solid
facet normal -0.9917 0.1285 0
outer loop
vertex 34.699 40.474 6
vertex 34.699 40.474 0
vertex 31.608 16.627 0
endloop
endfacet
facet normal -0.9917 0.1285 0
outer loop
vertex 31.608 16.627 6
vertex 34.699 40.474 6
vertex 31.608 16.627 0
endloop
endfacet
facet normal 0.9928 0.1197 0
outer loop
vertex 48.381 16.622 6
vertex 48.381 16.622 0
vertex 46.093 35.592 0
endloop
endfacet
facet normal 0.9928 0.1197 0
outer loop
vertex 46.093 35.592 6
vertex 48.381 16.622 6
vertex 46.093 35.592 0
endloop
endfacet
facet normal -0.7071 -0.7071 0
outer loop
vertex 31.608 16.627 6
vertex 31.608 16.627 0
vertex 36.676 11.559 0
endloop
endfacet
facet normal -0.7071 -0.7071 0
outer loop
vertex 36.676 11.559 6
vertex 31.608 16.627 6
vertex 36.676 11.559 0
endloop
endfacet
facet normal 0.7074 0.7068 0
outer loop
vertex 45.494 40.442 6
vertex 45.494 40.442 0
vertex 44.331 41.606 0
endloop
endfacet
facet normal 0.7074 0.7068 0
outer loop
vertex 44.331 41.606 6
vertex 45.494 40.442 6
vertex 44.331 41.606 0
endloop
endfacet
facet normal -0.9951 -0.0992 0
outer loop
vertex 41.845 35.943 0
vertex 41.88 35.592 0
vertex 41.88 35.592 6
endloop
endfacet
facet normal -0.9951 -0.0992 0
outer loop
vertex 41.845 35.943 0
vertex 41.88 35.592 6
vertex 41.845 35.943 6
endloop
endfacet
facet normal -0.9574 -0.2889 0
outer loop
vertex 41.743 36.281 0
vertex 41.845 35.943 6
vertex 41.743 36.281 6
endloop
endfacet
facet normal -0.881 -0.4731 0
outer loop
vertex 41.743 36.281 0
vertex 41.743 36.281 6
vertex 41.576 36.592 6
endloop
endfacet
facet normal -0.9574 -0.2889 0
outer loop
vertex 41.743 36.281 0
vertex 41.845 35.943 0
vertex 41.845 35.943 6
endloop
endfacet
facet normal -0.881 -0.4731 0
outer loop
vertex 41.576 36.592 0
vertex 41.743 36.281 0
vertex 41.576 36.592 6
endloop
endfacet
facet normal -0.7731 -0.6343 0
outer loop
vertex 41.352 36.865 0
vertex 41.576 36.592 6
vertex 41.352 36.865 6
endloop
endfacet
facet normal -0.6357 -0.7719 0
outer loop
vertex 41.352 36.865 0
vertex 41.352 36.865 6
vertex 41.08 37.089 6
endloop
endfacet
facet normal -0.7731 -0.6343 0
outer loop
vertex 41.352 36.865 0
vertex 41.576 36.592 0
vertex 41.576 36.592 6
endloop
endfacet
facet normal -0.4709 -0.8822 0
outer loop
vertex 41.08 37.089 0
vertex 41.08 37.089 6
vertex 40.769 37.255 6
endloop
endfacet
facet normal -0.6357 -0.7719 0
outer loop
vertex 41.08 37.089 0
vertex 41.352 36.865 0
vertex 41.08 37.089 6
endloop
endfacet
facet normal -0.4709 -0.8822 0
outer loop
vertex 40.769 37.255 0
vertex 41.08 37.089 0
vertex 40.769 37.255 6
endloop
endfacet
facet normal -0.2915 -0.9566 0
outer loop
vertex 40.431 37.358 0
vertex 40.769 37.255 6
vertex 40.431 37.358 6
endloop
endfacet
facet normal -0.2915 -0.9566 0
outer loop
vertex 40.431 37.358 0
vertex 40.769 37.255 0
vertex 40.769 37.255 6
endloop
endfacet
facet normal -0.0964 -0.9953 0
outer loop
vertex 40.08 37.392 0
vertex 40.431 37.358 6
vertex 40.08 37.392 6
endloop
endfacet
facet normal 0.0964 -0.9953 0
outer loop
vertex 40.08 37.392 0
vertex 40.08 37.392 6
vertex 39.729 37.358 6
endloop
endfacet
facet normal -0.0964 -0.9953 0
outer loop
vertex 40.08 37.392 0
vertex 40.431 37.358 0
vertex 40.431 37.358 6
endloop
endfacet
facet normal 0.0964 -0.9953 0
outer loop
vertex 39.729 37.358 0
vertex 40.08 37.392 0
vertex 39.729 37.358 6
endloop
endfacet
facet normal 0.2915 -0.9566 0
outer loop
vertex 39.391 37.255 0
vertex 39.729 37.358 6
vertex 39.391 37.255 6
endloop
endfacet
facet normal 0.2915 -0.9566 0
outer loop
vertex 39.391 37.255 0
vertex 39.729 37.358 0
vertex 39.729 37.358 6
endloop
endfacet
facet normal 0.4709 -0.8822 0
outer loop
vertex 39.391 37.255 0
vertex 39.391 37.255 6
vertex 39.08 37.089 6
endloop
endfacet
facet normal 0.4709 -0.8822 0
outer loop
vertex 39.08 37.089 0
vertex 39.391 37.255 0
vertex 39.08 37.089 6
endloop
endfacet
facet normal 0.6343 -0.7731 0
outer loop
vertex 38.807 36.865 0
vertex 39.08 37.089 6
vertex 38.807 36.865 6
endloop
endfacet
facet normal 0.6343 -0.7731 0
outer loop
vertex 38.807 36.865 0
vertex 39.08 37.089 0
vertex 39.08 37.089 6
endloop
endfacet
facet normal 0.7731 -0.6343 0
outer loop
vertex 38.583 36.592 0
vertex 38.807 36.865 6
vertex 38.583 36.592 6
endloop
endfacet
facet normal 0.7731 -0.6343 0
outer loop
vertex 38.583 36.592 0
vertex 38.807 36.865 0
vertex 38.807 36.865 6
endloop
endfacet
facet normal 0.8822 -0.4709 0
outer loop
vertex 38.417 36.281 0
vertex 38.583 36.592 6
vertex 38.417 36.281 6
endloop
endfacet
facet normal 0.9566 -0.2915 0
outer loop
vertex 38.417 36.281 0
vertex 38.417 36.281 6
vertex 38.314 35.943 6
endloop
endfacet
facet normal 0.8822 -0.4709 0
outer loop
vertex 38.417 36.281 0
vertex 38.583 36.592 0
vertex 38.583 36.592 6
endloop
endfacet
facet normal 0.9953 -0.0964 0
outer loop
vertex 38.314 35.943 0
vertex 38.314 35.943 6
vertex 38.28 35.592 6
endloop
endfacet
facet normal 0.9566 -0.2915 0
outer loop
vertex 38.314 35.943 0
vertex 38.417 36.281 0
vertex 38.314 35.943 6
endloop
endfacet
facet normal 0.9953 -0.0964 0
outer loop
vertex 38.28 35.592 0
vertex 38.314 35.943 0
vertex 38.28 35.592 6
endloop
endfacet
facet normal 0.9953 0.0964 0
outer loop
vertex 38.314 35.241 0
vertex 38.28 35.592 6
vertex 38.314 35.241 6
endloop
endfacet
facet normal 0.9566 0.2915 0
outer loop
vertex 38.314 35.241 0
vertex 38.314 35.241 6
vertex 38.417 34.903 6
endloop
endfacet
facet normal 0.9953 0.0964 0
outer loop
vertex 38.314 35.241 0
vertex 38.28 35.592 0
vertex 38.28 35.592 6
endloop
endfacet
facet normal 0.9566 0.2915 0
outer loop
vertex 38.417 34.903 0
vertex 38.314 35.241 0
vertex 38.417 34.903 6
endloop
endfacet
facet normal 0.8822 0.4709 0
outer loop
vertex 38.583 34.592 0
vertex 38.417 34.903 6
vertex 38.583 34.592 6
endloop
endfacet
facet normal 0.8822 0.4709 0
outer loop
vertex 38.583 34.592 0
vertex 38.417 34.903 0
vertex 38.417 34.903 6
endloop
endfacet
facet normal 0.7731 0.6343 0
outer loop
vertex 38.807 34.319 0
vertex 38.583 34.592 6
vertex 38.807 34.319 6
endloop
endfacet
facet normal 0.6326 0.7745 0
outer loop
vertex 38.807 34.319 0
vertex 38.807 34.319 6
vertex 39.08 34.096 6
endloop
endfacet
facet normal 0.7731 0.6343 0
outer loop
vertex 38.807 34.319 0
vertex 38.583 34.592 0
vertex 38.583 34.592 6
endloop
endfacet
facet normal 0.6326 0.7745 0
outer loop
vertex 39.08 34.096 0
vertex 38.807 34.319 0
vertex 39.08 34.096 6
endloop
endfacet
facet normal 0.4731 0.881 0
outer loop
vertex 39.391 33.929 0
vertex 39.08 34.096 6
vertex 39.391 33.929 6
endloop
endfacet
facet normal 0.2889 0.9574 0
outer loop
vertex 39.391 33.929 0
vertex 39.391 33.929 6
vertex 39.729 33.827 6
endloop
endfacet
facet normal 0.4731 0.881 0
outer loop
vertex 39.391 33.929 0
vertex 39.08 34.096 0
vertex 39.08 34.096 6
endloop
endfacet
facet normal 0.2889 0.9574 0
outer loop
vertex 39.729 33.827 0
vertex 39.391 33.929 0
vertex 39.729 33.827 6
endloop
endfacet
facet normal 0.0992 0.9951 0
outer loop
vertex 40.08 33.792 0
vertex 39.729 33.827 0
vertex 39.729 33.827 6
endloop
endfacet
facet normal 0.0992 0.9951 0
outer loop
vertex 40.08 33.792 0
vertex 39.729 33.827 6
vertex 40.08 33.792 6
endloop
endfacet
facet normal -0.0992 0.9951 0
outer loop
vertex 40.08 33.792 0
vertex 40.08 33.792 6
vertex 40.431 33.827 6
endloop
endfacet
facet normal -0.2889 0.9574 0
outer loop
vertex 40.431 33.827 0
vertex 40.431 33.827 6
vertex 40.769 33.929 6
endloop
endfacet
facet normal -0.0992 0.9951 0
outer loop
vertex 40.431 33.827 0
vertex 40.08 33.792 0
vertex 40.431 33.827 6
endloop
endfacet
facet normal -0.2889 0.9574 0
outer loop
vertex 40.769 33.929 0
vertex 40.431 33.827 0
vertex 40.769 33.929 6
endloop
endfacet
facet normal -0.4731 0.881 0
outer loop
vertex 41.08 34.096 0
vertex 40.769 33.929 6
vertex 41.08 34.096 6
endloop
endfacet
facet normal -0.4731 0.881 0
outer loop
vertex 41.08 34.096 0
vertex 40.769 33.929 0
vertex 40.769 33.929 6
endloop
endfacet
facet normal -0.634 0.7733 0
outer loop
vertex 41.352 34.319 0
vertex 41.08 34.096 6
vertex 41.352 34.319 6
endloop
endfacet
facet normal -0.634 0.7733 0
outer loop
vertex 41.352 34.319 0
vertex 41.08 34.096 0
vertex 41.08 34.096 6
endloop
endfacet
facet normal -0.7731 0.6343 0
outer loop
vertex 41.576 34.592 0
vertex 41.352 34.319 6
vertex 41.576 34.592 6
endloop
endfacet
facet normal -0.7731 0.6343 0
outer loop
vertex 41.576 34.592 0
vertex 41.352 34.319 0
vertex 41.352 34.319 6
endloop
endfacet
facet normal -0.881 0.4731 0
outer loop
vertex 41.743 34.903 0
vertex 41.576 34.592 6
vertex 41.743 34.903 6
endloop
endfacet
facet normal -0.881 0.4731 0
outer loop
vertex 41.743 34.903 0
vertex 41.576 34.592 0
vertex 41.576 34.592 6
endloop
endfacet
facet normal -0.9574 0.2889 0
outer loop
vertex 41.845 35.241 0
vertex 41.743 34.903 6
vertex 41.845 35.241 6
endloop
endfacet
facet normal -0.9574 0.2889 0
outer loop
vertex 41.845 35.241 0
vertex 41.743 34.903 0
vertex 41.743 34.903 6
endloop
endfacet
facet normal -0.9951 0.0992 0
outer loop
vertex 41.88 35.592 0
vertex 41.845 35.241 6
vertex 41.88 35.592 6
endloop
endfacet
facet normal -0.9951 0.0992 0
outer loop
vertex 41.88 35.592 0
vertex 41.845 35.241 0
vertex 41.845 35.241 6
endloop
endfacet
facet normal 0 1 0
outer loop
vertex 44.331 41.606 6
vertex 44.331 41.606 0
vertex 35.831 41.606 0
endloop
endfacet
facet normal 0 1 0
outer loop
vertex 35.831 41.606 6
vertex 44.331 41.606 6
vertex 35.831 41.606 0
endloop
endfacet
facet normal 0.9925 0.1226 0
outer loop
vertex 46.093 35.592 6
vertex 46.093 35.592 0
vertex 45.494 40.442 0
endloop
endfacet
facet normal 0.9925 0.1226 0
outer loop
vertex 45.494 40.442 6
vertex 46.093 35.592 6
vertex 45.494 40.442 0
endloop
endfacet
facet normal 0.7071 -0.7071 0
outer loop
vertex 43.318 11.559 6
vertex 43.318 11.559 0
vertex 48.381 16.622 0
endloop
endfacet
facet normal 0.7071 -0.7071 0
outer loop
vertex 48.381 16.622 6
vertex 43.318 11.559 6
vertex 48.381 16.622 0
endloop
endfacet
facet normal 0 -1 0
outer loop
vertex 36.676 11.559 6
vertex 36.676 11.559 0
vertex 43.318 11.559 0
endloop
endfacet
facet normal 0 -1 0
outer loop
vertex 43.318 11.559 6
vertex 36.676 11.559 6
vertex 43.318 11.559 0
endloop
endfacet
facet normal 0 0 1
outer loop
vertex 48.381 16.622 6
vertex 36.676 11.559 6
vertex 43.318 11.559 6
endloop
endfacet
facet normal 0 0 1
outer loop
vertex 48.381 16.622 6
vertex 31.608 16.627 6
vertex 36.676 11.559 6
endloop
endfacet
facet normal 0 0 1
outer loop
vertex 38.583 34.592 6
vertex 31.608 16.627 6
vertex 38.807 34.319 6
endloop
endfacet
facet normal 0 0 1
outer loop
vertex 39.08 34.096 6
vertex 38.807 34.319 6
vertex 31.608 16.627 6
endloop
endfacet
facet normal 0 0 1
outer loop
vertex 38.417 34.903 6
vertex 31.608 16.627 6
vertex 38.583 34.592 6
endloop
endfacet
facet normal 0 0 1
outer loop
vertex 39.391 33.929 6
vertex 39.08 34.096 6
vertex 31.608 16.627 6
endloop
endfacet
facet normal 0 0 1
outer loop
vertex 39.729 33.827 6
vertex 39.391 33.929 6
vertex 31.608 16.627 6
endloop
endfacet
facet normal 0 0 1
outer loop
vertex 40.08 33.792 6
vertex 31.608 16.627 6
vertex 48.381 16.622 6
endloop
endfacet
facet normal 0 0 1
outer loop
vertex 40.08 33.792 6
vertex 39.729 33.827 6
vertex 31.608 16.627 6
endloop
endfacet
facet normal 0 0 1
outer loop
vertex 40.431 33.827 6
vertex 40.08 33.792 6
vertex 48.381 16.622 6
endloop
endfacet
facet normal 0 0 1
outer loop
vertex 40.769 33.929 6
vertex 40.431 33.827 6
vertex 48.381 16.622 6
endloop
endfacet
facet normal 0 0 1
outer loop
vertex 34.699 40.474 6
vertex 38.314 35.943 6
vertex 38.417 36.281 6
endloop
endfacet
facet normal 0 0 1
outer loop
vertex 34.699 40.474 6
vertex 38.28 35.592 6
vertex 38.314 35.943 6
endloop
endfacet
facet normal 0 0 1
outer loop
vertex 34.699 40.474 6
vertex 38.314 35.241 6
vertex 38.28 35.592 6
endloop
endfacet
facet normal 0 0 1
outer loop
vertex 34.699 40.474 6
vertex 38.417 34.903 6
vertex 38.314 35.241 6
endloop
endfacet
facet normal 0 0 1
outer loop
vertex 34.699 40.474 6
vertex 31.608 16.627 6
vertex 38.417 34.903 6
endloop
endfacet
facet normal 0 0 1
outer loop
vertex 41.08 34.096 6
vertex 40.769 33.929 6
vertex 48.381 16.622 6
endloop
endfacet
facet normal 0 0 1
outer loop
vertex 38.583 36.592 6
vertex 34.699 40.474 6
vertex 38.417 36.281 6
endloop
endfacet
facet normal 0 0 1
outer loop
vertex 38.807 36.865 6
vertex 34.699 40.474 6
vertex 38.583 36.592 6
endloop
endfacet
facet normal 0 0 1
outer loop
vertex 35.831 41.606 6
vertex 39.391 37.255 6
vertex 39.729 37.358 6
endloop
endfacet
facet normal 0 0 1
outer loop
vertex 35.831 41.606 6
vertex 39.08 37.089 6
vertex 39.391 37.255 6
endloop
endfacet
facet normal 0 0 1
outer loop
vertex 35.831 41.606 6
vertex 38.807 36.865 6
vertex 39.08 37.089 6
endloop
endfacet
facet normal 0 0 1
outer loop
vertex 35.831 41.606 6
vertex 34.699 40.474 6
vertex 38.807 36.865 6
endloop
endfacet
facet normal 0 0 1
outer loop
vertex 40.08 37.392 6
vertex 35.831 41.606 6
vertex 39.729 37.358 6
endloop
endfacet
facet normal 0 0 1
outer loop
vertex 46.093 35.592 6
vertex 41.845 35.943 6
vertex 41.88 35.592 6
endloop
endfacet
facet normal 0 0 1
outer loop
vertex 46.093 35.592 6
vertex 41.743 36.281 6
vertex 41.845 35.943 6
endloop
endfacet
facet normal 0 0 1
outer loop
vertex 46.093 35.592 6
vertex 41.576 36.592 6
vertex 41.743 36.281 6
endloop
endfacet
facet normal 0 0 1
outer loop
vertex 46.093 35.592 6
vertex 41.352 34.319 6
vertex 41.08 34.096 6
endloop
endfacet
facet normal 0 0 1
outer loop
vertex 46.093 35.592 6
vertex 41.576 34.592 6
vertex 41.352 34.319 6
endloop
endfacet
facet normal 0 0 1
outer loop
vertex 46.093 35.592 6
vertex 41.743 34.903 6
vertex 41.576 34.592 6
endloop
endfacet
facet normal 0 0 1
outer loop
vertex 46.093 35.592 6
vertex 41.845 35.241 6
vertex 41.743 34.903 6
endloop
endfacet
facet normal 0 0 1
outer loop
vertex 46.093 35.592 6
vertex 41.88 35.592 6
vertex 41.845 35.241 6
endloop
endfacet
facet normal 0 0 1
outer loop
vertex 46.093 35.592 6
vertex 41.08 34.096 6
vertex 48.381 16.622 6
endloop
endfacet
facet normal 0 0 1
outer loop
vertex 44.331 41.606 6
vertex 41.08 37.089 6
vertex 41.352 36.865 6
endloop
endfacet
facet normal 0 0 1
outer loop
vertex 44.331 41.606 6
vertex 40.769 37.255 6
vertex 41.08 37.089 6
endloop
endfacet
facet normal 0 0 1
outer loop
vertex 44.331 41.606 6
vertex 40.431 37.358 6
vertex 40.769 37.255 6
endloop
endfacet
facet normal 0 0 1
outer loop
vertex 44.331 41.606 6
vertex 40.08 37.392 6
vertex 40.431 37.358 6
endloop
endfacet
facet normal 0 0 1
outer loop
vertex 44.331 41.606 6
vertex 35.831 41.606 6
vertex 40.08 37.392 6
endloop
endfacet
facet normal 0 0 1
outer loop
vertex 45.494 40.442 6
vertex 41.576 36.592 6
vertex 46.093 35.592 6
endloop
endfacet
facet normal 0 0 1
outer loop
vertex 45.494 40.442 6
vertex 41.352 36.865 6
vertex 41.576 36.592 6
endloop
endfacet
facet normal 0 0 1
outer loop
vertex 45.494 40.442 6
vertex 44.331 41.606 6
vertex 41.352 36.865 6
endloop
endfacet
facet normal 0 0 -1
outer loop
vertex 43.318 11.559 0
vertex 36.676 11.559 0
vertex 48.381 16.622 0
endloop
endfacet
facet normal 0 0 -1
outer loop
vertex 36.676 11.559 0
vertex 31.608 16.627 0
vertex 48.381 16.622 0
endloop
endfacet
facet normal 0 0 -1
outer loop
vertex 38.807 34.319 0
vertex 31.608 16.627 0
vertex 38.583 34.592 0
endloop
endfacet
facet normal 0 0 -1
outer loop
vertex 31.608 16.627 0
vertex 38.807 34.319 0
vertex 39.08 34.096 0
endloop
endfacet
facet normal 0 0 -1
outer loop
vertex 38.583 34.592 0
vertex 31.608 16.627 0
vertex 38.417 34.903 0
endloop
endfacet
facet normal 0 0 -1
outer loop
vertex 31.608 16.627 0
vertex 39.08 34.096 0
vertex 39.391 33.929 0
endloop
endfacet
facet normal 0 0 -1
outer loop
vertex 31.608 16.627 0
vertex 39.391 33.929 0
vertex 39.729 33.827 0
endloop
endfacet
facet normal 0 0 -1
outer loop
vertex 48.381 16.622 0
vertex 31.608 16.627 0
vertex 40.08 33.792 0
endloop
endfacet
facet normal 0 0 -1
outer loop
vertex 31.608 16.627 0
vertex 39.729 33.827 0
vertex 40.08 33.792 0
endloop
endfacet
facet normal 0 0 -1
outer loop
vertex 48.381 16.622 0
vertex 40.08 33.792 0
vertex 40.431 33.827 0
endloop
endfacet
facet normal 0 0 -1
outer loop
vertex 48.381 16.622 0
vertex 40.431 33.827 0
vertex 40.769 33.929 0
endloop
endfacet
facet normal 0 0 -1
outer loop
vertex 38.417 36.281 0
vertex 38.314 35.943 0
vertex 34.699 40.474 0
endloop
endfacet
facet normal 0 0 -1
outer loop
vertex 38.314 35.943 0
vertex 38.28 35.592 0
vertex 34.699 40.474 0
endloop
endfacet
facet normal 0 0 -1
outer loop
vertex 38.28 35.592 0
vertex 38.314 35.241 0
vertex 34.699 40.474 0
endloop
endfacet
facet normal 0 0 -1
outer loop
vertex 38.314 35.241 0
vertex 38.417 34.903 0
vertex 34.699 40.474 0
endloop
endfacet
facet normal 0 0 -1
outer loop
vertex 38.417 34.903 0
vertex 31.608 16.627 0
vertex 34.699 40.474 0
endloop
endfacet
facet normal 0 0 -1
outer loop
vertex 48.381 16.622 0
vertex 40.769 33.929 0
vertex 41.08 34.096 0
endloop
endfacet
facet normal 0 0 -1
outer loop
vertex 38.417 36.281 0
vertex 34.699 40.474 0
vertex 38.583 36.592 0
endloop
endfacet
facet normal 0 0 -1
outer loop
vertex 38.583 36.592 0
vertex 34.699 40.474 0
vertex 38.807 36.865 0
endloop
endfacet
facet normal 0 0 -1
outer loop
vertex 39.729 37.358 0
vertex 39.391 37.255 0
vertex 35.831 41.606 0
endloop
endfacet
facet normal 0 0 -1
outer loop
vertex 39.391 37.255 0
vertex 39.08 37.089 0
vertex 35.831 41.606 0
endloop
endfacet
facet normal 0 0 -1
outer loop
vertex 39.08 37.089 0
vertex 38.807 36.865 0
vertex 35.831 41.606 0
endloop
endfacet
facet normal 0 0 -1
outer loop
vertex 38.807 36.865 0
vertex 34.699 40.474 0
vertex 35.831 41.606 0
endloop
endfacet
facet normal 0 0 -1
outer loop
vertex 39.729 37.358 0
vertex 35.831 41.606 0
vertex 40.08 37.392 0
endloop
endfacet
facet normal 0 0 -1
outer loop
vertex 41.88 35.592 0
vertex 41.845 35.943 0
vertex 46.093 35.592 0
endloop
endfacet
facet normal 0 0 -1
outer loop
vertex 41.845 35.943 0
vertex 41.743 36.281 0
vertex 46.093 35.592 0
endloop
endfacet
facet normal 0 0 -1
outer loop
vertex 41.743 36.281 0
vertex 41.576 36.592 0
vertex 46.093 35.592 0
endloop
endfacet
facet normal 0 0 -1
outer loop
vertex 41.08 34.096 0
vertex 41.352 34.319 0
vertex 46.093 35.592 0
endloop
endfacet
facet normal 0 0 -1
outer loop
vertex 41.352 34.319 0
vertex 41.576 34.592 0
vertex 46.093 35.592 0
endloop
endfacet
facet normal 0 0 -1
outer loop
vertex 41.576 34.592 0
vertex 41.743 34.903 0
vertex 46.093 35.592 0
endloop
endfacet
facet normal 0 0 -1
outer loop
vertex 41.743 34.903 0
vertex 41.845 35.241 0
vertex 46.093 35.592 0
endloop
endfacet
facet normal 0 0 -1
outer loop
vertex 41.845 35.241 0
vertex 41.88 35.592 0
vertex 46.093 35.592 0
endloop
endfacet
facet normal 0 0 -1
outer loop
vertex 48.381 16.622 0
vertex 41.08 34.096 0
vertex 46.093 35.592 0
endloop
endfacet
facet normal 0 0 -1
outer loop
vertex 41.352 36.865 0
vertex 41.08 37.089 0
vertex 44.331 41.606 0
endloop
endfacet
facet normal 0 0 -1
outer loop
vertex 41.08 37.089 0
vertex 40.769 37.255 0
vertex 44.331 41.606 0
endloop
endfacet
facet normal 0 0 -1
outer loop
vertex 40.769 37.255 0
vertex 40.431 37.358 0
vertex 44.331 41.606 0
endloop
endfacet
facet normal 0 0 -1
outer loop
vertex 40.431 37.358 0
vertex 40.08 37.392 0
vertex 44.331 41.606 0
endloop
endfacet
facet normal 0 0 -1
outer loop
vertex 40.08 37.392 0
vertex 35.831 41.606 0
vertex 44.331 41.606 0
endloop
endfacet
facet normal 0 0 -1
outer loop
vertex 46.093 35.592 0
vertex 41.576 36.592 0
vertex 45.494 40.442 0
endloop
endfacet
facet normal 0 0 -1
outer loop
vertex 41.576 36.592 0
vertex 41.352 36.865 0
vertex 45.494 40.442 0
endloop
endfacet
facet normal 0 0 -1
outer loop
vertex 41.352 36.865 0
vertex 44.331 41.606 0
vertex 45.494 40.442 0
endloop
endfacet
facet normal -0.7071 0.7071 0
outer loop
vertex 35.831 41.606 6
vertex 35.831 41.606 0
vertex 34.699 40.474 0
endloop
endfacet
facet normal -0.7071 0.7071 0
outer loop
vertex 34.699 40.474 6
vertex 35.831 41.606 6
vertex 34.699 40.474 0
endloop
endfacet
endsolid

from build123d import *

# Parameters (mm, degrees)
MODEL_R                  = 1.8
RESSALTO_EXTRUS_O1_DEPTH = 6


with BuildPart() as part:
    # Model → Ressalto-extrusão1 (new body)
    with BuildSketch(Plane.XY):
        Polygon((36.676362522, 11.559126959), (43.318311298, 11.559126959), (48.38117681, 16.621992471), (46.093165841, 35.592208395), (45.494331575, 40.442304919), (44.330954819, 41.605681674), (35.830954819, 41.605681674), (34.69889139, 40.473618245), (31.60820441, 16.627285071), align=None)
        with Locations((40.079692562, 35.592208395)):
            Circle(MODEL_R, mode=Mode.SUBTRACT)
    extrude(amount=RESSALTO_EXTRUS_O1_DEPTH)


solid = part.part
